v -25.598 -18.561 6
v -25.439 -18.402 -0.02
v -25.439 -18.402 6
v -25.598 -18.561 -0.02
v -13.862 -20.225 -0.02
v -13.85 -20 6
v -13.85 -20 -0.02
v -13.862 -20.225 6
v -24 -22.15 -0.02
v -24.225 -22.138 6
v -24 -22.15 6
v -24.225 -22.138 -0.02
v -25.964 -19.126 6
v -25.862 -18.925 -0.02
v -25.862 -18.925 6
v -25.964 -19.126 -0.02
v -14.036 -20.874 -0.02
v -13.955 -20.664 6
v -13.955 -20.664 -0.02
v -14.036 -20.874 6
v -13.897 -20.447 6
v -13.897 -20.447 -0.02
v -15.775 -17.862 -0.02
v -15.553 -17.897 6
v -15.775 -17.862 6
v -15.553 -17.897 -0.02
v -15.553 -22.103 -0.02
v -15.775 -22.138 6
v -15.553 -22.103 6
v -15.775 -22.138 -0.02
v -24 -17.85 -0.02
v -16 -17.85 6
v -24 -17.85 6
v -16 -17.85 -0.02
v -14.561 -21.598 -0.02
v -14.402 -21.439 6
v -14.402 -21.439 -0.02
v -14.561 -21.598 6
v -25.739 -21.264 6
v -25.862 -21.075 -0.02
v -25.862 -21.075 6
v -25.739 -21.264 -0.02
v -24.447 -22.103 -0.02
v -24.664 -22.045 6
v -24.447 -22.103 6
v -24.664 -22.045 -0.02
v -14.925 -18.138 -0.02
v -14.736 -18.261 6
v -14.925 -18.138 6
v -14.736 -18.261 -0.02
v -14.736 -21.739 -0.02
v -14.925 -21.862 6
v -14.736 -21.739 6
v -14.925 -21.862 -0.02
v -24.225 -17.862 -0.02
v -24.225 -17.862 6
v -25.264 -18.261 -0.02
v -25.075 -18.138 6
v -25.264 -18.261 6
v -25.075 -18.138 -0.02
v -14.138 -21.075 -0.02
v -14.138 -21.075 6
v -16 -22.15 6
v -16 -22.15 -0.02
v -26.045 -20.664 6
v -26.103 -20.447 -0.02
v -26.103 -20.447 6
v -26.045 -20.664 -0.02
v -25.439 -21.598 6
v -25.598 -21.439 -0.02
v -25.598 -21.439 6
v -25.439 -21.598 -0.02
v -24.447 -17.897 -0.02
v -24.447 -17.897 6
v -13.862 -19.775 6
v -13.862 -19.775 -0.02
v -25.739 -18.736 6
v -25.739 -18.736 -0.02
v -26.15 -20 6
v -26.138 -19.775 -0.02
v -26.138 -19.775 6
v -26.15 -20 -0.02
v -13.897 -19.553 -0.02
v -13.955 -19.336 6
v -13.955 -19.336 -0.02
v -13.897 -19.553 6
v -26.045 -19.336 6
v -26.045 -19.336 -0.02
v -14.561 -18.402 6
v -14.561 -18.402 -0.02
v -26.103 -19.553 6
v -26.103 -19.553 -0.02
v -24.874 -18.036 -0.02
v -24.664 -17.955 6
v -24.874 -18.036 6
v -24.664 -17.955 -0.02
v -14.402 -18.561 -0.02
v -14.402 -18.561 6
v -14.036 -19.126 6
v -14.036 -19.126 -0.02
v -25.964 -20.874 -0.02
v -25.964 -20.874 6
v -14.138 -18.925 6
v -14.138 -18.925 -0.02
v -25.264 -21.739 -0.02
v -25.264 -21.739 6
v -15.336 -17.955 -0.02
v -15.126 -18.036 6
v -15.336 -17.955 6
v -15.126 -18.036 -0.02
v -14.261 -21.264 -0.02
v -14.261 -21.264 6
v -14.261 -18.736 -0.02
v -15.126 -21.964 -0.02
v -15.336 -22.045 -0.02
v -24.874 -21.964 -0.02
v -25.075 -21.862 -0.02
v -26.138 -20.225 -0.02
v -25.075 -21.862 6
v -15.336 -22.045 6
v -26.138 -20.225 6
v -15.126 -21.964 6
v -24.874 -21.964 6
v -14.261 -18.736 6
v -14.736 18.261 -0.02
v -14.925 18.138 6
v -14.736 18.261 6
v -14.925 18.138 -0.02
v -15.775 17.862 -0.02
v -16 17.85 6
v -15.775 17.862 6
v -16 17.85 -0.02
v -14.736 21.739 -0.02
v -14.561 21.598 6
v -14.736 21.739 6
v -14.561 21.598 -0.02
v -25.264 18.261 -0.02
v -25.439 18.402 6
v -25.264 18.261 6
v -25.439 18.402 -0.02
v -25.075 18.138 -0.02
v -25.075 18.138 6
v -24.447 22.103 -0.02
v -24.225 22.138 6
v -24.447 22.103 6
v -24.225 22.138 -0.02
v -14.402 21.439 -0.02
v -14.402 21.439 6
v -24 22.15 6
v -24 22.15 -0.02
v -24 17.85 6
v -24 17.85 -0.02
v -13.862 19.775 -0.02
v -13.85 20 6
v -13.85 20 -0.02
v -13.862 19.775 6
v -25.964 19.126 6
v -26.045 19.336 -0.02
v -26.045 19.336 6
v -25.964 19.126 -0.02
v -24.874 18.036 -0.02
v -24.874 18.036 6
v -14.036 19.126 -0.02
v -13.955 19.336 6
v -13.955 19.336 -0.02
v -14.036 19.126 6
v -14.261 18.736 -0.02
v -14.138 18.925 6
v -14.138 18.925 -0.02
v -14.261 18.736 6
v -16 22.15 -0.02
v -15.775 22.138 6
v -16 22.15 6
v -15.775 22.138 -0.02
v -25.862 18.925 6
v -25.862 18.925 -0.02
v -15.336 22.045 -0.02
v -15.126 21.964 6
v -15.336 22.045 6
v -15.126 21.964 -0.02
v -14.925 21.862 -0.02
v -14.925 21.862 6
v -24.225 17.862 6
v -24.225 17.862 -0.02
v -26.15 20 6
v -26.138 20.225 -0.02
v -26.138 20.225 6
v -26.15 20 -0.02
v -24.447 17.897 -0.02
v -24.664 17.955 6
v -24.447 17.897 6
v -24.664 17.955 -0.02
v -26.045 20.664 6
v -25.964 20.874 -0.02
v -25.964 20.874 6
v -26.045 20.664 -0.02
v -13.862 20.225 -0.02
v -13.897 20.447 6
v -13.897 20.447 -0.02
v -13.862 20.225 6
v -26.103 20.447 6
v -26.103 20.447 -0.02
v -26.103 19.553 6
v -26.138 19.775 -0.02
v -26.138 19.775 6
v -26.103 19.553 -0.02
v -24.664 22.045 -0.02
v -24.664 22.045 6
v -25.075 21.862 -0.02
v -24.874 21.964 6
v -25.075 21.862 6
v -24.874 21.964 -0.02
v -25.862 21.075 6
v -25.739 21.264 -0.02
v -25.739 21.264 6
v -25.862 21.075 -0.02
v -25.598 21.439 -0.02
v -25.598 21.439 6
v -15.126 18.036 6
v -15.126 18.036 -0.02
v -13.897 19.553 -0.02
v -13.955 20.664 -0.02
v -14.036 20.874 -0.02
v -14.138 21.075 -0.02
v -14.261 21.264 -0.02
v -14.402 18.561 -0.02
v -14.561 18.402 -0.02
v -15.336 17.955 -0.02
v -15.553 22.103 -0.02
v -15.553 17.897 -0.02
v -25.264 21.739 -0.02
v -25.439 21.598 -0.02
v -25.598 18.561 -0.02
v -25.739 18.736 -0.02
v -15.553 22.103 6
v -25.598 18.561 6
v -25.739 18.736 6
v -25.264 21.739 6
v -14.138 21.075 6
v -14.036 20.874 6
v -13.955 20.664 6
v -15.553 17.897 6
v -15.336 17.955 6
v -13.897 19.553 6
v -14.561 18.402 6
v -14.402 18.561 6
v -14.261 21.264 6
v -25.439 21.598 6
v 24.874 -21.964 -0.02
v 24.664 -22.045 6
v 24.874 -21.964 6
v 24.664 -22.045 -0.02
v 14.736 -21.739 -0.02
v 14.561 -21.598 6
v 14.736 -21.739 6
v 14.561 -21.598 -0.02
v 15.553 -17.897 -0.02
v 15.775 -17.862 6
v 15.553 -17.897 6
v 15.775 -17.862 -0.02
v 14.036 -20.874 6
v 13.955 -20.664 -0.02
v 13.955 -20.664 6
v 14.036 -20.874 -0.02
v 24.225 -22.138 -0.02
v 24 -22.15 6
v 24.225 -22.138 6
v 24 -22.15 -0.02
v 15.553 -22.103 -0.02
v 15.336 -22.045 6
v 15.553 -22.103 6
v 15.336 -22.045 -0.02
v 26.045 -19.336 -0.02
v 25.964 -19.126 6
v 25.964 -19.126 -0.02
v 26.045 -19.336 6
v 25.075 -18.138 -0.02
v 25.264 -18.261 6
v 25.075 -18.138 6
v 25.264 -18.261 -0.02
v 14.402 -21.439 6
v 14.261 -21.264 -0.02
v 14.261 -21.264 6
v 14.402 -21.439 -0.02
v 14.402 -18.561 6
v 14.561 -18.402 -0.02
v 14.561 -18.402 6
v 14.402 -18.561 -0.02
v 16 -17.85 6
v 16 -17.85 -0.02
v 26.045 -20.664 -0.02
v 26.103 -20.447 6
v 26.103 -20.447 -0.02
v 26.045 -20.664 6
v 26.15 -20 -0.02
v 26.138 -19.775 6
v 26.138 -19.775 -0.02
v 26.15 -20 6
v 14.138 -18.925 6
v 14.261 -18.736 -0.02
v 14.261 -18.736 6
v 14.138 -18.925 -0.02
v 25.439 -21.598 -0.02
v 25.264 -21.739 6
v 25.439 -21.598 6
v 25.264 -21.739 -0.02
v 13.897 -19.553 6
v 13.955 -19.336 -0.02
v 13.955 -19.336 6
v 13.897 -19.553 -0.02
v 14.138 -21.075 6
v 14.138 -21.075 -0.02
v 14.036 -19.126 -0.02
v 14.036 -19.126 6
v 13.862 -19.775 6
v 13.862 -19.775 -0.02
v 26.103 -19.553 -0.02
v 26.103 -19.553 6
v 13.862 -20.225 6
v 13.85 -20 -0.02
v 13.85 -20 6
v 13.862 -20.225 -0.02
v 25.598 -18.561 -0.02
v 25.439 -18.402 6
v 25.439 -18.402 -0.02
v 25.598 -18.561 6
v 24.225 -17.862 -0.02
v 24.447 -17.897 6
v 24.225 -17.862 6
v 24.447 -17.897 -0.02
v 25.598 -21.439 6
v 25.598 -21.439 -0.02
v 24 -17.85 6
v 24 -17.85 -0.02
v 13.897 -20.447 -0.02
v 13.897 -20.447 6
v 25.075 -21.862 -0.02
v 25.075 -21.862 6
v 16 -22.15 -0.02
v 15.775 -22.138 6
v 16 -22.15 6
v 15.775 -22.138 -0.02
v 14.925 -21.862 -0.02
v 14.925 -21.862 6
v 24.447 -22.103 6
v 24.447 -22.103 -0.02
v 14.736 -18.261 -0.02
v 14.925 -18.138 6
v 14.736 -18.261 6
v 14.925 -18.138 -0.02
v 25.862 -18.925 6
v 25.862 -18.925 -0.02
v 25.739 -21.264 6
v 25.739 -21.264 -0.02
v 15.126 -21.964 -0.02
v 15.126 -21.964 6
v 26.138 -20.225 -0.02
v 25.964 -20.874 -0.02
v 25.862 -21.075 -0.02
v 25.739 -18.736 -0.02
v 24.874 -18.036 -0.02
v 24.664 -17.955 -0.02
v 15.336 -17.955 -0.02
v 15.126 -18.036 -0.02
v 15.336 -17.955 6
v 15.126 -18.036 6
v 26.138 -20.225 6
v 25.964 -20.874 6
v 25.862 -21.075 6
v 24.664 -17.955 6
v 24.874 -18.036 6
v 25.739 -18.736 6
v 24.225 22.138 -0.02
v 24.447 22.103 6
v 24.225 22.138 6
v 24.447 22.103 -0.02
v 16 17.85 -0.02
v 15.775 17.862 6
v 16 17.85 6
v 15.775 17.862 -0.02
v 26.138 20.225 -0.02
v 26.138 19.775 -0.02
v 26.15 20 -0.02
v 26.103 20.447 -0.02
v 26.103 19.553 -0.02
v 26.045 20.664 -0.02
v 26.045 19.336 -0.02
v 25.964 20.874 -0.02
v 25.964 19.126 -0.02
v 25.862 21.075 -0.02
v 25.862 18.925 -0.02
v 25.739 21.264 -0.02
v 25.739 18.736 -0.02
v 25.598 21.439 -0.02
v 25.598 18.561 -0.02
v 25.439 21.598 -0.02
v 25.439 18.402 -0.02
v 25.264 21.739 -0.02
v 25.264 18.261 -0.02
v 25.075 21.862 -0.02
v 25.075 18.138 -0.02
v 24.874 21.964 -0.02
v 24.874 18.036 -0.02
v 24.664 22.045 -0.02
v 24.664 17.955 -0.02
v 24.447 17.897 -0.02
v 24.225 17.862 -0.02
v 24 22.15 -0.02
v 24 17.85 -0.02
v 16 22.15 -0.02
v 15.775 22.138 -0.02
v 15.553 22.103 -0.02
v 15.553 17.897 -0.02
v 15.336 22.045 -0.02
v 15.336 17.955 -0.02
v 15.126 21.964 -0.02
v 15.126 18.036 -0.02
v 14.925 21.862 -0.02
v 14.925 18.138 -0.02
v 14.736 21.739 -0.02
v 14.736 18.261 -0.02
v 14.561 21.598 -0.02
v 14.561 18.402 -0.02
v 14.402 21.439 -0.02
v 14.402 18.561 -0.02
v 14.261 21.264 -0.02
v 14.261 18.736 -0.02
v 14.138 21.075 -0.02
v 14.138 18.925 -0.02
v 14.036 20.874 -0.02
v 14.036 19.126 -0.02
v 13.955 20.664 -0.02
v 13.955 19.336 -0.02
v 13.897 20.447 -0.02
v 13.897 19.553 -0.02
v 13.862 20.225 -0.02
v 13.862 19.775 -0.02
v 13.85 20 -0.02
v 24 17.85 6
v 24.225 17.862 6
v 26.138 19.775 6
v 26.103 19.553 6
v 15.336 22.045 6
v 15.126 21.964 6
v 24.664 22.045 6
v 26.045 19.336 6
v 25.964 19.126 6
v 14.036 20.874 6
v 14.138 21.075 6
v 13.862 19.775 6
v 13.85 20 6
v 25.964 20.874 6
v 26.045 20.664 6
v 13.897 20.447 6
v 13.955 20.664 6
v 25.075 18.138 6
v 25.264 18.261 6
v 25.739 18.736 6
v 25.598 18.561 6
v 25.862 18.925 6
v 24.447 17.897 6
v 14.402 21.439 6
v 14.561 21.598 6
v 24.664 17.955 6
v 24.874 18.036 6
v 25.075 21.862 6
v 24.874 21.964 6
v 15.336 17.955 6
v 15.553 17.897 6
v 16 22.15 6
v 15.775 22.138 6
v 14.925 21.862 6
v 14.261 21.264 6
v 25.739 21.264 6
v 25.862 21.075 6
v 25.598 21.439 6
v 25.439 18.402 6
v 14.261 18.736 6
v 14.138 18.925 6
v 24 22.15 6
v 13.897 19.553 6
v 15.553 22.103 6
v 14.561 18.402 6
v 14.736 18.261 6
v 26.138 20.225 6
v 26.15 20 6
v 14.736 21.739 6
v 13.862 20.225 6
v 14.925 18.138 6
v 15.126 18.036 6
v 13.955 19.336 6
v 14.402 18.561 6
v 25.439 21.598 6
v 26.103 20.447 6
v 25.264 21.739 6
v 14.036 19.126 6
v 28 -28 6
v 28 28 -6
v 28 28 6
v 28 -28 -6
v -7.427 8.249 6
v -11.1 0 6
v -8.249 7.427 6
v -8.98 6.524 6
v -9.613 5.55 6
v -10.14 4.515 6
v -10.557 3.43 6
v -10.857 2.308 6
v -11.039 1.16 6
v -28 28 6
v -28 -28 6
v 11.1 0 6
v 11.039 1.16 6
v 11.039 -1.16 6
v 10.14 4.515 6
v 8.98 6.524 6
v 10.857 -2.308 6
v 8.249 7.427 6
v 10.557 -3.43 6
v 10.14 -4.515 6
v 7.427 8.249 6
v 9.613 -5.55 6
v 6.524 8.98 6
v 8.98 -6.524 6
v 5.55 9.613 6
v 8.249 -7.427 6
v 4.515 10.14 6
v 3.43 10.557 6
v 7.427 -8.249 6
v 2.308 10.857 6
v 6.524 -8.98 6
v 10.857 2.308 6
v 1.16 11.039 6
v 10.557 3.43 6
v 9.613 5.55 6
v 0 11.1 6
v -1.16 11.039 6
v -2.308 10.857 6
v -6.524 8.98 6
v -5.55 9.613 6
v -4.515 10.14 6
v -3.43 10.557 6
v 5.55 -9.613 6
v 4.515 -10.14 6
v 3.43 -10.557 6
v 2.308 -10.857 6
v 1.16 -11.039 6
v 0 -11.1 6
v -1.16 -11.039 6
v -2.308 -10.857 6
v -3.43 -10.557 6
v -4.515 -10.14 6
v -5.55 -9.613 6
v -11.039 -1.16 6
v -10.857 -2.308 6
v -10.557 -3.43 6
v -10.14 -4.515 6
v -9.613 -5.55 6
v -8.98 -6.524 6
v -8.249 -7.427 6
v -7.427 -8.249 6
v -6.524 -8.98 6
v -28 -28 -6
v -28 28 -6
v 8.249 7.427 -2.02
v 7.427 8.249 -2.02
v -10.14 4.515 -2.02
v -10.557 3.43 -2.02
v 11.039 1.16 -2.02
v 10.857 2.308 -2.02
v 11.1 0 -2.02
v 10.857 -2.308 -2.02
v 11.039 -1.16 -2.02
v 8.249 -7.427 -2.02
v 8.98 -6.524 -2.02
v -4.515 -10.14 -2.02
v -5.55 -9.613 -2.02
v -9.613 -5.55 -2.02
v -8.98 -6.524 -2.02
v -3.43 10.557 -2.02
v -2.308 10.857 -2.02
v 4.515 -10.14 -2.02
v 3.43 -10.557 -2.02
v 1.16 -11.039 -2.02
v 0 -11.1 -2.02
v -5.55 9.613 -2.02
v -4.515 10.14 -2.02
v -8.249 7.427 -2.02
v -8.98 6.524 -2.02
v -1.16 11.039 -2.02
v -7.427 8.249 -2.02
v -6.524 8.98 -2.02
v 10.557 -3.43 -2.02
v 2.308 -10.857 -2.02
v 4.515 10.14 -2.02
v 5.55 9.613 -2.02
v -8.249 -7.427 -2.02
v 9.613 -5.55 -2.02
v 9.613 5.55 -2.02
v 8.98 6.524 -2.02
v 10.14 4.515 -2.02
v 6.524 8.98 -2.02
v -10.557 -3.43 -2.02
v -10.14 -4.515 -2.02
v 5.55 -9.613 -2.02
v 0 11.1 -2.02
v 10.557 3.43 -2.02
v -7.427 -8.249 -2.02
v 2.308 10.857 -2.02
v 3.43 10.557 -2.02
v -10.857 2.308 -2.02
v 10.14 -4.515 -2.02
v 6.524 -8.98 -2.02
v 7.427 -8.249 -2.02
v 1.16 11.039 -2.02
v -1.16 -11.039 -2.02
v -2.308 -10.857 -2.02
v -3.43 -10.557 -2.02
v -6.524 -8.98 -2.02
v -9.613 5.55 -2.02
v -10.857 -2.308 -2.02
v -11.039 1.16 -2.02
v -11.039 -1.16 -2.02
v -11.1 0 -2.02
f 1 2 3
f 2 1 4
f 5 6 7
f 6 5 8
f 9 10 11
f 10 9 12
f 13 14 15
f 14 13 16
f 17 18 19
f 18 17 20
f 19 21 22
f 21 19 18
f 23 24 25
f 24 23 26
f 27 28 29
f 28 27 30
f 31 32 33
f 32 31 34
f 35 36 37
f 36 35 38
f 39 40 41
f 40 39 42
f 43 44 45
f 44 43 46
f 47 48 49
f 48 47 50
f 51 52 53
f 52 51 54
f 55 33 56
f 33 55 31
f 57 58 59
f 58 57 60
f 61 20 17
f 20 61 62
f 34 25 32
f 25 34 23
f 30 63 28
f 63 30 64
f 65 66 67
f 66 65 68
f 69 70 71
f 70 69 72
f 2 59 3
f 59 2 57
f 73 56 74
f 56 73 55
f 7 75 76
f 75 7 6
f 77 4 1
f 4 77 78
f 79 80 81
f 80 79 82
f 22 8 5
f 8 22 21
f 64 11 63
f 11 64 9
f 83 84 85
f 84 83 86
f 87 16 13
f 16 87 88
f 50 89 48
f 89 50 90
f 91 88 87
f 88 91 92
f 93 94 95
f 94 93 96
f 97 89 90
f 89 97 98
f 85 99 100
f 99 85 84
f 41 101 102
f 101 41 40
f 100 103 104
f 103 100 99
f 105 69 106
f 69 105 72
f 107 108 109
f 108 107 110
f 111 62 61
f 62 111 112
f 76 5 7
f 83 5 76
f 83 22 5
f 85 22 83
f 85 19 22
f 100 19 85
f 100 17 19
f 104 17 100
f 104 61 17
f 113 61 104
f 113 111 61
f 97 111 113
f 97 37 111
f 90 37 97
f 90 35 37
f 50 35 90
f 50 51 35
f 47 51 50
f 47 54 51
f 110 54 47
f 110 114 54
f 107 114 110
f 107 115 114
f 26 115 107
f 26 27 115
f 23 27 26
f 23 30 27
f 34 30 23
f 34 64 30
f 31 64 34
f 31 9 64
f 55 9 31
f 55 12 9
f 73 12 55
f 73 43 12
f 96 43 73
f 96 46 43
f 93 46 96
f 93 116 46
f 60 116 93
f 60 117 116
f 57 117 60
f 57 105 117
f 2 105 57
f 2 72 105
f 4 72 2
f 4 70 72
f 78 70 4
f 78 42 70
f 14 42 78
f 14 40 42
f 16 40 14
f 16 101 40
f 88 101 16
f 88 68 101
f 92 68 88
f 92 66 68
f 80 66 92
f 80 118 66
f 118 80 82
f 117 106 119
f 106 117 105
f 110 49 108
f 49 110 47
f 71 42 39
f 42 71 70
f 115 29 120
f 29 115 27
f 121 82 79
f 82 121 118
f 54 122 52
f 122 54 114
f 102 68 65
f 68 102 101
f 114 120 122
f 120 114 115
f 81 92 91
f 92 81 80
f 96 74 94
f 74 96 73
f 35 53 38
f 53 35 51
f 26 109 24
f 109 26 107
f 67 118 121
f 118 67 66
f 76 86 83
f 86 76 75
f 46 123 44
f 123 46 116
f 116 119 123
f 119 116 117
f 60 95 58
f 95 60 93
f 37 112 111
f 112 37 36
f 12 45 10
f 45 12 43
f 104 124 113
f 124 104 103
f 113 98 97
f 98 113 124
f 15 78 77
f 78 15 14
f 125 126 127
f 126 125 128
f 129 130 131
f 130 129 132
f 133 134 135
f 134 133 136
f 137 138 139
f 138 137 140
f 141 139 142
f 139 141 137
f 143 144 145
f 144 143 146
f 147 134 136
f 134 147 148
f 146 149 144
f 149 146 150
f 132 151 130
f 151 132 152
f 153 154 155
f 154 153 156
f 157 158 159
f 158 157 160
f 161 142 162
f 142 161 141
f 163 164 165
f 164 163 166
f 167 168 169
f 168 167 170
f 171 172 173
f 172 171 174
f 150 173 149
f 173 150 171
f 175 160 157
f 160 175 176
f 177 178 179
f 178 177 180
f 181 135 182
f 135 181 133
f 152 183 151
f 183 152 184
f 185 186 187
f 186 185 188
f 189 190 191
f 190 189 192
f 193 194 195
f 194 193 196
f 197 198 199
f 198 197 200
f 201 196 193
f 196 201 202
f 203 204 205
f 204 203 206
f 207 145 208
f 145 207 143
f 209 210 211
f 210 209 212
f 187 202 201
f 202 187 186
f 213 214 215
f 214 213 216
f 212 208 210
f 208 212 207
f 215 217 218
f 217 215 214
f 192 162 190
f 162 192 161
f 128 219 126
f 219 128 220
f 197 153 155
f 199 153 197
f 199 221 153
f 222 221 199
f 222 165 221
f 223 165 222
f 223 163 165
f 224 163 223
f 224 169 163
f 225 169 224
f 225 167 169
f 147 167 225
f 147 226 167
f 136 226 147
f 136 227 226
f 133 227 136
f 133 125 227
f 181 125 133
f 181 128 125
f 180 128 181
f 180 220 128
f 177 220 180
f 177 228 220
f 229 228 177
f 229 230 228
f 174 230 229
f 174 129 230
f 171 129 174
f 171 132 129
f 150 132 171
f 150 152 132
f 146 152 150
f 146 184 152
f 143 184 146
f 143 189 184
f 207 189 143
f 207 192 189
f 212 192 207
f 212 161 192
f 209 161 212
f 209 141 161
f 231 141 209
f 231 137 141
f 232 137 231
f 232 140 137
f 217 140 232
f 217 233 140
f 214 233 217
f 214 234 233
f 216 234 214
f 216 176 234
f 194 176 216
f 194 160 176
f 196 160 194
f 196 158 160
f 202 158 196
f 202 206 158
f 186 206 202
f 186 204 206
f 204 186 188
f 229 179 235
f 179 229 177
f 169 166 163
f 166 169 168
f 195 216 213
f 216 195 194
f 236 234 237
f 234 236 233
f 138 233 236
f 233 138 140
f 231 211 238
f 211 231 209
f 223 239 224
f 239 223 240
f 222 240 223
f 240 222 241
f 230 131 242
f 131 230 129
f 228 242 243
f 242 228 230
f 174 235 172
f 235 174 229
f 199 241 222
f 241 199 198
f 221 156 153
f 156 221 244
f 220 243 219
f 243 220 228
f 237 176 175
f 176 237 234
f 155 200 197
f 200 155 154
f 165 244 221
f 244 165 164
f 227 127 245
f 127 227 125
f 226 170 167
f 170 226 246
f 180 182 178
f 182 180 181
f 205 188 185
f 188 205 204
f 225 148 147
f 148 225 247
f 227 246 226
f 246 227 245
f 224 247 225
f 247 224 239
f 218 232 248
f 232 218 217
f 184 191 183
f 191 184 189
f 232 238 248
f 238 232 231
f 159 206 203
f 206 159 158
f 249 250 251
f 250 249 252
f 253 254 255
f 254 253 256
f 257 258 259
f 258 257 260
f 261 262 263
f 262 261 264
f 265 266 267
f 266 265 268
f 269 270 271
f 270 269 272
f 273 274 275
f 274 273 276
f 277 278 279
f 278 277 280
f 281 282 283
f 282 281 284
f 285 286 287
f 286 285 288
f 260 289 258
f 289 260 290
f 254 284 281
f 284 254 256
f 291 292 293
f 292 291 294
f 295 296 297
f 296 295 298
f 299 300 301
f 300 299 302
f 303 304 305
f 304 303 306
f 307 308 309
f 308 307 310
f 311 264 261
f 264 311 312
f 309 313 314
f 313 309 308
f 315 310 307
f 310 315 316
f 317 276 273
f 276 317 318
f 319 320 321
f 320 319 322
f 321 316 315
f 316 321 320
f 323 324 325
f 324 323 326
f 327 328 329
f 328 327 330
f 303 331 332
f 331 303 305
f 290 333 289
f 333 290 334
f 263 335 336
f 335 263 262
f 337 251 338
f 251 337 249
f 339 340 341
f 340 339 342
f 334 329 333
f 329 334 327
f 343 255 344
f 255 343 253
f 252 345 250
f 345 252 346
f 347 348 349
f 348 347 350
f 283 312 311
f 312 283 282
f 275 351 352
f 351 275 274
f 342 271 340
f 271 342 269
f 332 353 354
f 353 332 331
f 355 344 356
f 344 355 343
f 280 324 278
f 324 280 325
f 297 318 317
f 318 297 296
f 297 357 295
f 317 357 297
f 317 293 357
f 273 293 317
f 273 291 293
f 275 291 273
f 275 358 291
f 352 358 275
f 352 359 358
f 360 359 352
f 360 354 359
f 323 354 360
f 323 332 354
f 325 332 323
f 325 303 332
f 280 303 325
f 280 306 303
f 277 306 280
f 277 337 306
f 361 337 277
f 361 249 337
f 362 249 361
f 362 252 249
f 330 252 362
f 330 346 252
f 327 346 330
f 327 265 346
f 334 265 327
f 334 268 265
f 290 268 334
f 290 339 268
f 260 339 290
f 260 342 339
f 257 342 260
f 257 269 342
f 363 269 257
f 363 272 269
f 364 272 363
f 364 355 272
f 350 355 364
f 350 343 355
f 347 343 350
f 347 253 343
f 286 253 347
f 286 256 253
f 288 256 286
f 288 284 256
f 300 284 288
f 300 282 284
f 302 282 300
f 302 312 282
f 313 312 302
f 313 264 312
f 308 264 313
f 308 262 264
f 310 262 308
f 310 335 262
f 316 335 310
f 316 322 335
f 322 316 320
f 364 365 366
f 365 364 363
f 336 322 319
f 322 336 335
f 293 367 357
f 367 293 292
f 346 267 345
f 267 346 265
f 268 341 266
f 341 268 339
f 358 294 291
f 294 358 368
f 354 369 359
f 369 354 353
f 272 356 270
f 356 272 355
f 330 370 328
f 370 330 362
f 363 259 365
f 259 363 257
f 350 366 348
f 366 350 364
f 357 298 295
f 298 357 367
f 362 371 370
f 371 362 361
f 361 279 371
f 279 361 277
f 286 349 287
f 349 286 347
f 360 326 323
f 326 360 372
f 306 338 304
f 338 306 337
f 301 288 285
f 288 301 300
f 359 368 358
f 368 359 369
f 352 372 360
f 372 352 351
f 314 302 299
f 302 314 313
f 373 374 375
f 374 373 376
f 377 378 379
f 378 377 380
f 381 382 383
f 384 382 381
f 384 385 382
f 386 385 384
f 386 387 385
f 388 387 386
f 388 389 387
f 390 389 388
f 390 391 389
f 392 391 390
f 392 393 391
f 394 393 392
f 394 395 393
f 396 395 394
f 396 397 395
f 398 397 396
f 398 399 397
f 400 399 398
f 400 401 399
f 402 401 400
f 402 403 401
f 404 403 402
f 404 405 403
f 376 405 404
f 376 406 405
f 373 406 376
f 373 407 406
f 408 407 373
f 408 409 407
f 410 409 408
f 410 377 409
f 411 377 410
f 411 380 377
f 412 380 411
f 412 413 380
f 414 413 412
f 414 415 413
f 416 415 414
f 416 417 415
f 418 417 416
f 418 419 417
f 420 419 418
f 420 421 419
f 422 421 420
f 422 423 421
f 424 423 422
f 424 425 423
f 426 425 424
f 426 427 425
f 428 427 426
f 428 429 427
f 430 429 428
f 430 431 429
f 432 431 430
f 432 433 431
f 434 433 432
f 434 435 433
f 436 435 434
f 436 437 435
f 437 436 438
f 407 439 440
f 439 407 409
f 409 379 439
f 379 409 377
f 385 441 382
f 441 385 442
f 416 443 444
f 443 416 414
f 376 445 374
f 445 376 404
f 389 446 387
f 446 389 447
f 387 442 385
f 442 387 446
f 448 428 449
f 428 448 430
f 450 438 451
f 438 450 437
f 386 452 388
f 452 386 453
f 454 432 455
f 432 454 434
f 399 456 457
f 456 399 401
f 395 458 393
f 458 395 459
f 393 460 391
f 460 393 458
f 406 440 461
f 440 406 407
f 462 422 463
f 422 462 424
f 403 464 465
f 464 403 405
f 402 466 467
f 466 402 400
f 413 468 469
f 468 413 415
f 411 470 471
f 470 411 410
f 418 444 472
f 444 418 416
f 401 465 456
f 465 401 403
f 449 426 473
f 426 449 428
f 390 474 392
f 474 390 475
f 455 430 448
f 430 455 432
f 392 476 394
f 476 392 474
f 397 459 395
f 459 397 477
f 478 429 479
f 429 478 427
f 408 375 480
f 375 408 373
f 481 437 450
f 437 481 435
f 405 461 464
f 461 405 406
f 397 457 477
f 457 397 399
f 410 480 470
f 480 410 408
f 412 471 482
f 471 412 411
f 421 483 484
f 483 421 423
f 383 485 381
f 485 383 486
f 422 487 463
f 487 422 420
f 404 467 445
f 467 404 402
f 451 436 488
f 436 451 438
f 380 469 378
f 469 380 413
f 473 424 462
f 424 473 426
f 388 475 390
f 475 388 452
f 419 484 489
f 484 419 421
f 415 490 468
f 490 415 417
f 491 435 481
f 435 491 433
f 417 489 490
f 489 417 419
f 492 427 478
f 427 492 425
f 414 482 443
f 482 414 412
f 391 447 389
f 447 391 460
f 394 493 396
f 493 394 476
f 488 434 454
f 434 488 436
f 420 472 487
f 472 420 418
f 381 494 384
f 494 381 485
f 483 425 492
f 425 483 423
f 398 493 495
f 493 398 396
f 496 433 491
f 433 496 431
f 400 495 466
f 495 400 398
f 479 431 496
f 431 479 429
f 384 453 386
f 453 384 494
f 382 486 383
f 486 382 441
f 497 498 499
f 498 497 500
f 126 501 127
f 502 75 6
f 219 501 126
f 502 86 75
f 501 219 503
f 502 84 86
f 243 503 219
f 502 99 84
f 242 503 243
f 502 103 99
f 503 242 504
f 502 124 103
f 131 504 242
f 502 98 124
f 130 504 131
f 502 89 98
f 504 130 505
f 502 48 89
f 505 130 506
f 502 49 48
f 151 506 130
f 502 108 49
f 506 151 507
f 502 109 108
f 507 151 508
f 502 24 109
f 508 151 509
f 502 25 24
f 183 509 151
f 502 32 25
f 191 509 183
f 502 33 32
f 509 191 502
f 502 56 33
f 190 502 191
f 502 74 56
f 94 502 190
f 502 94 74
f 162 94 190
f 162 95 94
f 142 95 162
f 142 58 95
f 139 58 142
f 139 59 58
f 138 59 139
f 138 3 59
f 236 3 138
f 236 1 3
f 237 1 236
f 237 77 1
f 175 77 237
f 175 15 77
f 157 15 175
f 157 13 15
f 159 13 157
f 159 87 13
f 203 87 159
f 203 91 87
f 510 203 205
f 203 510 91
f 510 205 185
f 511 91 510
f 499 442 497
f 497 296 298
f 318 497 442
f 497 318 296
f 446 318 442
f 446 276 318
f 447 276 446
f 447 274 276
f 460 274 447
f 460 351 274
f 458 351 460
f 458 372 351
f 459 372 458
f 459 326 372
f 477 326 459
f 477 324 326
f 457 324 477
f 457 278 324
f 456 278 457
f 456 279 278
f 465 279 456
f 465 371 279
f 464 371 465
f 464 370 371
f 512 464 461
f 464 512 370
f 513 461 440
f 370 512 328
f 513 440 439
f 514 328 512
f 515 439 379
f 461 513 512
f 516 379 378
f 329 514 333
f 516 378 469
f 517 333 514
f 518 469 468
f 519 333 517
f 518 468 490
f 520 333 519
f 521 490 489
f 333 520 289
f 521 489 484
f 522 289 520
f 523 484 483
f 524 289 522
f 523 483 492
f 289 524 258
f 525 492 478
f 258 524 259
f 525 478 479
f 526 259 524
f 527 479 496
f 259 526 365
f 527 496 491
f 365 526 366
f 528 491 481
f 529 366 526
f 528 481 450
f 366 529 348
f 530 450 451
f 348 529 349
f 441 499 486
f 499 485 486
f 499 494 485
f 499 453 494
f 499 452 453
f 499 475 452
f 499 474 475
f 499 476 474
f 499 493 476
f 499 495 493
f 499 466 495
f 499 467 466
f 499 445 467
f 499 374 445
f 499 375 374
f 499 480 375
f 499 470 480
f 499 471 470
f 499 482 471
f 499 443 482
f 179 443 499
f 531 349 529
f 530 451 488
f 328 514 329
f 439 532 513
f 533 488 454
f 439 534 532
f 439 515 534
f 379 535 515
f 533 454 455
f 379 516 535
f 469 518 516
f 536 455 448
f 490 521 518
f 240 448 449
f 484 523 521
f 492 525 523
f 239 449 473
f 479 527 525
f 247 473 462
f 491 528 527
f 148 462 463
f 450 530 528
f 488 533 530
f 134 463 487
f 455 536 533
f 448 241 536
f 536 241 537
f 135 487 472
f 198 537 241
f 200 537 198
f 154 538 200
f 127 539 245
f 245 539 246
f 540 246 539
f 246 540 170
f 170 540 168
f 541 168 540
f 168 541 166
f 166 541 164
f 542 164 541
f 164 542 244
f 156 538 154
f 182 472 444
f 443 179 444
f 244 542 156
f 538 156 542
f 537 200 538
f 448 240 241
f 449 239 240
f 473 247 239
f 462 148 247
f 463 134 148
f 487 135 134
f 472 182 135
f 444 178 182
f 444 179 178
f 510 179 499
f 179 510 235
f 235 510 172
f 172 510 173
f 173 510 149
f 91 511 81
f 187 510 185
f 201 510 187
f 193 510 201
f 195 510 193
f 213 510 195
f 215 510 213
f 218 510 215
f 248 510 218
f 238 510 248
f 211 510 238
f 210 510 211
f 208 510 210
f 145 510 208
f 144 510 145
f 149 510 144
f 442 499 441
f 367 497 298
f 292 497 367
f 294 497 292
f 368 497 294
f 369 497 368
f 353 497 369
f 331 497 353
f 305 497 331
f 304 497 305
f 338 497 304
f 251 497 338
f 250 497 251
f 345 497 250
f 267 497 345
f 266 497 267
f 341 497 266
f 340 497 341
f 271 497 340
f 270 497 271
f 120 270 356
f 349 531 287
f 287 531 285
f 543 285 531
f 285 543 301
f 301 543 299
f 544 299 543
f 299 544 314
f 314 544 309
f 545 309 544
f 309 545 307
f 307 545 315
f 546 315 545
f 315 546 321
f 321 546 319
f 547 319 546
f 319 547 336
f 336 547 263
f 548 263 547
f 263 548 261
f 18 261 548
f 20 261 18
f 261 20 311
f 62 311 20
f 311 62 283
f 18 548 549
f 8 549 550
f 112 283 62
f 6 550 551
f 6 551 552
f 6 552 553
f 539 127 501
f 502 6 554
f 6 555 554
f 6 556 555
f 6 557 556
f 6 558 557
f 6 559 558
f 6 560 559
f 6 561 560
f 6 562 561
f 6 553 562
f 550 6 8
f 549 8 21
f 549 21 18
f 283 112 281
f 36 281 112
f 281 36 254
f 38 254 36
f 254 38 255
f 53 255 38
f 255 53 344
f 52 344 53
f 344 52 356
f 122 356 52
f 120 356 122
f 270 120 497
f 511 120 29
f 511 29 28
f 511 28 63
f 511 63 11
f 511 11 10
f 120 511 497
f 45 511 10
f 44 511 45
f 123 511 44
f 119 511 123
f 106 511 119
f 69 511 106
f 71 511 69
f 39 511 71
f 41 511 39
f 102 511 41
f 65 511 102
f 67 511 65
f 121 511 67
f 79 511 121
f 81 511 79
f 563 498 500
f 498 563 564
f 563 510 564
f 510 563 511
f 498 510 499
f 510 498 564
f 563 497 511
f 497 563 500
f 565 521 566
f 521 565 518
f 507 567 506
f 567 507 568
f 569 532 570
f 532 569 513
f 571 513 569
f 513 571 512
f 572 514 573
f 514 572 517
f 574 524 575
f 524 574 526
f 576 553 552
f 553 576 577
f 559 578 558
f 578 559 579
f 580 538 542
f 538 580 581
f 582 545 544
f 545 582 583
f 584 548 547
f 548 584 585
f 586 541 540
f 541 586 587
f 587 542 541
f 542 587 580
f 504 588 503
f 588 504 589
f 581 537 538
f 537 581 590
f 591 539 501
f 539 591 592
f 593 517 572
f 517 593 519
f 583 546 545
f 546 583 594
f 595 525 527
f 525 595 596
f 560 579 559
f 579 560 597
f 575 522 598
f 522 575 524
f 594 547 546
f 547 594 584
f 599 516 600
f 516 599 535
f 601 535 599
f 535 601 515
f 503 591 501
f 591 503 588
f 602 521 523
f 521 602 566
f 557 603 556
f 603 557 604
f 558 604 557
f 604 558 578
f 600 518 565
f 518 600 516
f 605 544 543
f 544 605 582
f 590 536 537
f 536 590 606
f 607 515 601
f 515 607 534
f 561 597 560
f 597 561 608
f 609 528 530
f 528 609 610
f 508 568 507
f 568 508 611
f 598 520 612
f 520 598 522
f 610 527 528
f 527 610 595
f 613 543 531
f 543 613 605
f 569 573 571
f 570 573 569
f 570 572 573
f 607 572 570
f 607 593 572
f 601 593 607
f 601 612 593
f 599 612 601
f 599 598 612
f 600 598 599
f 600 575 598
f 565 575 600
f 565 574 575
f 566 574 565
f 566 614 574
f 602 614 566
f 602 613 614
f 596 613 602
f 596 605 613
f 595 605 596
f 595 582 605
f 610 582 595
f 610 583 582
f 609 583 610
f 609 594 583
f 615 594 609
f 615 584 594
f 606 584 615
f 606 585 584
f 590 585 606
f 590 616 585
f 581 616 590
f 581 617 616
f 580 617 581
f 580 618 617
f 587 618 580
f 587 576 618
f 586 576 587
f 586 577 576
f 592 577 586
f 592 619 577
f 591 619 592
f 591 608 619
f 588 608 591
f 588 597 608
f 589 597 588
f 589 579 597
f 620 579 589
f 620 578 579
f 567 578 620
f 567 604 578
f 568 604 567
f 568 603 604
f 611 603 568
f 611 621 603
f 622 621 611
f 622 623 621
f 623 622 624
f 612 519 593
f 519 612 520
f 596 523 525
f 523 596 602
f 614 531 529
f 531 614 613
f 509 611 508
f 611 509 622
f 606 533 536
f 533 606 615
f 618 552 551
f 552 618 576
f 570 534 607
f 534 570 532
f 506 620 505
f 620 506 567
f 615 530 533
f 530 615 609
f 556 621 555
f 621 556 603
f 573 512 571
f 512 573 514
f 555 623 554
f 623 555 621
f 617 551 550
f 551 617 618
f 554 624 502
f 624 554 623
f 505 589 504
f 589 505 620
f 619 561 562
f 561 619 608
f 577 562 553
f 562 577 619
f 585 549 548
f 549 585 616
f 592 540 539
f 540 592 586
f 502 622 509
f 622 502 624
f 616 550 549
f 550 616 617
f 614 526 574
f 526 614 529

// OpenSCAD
// 608 bearing mounting plate
// Flanged 608 bearing pocket with a 4 mm bottom and four mounting slots.
$fn = 60;
eps = 0.02;
base_w = 56;
base_h = 56;
base_t = 12;
bearing_d = 22.2;
bearing_depth = 8;
bottom_t = base_t - bearing_depth;
slot_l = 8;
slot_d = 4.3;
mount_pitch = 40;

module mounting_slot(x, y) {
    hull() {
        translate([x - slot_l / 2, y, -eps]) cylinder(d = slot_d, h = base_t + 2 * eps);
        translate([x + slot_l / 2, y, -eps]) cylinder(d = slot_d, h = base_t + 2 * eps);
    }
}

difference() {
    cube([base_w, base_h, base_t], center = true);
    translate([0, 0, base_t / 2 - bearing_depth - eps])
        cylinder(d = bearing_d, h = bearing_depth + 2 * eps);
    for (x = [-mount_pitch / 2, mount_pitch / 2], y = [-mount_pitch / 2, mount_pitch / 2])
        mounting_slot(x, y);
}
